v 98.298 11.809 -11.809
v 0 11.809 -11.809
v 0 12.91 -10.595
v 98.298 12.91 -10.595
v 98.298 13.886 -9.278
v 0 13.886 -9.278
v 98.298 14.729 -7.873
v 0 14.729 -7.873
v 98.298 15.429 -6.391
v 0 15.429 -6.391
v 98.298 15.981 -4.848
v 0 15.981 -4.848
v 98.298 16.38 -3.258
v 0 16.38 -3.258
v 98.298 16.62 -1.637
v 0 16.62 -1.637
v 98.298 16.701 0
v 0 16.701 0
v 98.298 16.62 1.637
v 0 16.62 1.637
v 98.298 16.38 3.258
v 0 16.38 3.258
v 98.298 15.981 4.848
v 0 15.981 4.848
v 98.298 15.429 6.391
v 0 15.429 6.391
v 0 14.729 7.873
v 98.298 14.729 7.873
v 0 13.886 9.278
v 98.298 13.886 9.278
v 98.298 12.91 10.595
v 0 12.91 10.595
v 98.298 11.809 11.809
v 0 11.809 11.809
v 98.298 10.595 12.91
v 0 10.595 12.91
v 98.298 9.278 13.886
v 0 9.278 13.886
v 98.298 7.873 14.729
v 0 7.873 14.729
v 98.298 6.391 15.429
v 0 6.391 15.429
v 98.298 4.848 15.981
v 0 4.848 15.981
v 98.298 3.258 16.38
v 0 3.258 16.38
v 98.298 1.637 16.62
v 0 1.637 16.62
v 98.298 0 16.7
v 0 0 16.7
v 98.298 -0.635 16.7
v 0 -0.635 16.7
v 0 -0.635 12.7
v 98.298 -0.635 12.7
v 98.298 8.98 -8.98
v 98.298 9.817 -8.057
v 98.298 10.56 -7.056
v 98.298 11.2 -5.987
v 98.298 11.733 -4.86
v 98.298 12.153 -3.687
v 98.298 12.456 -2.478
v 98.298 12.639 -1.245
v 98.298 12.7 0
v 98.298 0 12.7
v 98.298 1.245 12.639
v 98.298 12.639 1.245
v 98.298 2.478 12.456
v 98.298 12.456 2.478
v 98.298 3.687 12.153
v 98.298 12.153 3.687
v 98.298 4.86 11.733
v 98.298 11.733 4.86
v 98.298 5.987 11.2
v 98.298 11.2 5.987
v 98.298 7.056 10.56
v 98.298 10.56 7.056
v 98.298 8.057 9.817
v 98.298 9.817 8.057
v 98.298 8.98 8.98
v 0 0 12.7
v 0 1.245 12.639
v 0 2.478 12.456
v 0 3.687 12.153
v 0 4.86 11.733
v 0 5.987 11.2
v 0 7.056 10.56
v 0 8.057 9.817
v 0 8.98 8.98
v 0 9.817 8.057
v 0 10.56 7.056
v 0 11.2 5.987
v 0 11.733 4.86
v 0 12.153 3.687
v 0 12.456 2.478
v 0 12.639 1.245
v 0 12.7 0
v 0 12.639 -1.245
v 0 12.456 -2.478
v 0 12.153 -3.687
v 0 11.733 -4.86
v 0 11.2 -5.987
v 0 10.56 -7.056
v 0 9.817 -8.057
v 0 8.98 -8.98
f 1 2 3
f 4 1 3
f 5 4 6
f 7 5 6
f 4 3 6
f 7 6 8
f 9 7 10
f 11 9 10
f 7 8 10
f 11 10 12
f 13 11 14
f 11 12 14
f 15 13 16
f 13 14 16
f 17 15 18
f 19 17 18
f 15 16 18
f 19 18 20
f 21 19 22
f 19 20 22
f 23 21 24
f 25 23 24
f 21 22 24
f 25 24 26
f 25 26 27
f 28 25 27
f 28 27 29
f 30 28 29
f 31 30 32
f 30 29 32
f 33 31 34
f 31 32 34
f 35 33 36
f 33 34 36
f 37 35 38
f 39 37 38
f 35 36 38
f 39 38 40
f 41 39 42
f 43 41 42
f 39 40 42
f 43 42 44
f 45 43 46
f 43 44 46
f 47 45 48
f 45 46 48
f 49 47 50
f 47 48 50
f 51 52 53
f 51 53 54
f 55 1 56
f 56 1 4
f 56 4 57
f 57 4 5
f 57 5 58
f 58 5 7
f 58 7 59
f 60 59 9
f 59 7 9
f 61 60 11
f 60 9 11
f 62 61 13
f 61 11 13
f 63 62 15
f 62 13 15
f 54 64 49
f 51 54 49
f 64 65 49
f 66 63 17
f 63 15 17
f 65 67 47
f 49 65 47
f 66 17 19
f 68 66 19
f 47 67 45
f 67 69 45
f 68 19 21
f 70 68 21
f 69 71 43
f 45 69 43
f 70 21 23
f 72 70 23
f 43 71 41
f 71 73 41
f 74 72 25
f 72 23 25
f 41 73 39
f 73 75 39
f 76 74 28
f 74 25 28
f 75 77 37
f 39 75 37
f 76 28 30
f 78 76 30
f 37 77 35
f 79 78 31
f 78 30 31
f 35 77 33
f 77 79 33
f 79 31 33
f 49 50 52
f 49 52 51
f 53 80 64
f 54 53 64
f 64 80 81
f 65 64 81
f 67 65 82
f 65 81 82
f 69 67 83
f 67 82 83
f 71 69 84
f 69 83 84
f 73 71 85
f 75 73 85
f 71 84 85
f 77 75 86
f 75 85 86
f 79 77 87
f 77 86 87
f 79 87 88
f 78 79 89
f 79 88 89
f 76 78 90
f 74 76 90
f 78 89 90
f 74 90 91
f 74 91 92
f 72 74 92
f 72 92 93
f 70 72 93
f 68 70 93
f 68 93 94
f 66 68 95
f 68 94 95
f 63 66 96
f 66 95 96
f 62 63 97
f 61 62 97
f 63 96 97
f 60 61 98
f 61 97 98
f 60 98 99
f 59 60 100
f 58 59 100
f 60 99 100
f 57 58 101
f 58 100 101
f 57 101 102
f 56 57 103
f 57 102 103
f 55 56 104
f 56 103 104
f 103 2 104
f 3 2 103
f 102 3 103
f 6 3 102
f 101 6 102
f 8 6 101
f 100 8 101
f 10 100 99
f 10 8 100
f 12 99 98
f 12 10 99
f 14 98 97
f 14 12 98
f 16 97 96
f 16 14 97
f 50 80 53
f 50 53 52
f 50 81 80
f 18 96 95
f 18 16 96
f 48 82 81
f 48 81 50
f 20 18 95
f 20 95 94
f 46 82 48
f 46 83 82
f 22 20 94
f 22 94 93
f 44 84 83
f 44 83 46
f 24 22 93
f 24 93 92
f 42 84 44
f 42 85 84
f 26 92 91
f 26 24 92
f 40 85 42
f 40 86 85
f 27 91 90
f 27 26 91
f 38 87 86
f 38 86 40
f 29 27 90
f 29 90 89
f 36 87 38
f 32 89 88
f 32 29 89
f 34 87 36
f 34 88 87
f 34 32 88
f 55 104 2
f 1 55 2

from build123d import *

# Parameters (mm, degrees)
BOSS_EXTRUDE1_DEPTH = 98.298
SKETCH2_W           = 98.298
SKETCH2_H           = 4.0005
BOSS_EXTRUDE2_DEPTH = 0.635


with BuildPart() as part:
    # Sketch1 → Boss-Extrude1 (new body)
    with BuildSketch(Plane(origin=(0, 0, 0), x_dir=(0, 0, -1), z_dir=(1, 0, 0))):
        with BuildLine():
            Line((-16.7005, 0), (-12.7, 0))
            ThreePointArc((-12.7, 0), (-4.860079591, 11.733270063), (8.980256121, 8.980256121))
            Line((8.980256121, 8.980256121), (11.809036799, 11.809036799))
            ThreePointArc((11.809036799, 11.809036799), (-6.391004662, 15.429250133), (-16.7005, 0))
        make_face()
    extrude(amount=BOSS_EXTRUDE1_DEPTH)

    # Sketch2 → Boss-Extrude2 (add)
    with BuildSketch(Plane.XZ):
        with Locations((49.149, 14.70025)):
            Rectangle(SKETCH2_W, SKETCH2_H)
    extrude(amount=BOSS_EXTRUDE2_DEPTH)


solid = part.part
